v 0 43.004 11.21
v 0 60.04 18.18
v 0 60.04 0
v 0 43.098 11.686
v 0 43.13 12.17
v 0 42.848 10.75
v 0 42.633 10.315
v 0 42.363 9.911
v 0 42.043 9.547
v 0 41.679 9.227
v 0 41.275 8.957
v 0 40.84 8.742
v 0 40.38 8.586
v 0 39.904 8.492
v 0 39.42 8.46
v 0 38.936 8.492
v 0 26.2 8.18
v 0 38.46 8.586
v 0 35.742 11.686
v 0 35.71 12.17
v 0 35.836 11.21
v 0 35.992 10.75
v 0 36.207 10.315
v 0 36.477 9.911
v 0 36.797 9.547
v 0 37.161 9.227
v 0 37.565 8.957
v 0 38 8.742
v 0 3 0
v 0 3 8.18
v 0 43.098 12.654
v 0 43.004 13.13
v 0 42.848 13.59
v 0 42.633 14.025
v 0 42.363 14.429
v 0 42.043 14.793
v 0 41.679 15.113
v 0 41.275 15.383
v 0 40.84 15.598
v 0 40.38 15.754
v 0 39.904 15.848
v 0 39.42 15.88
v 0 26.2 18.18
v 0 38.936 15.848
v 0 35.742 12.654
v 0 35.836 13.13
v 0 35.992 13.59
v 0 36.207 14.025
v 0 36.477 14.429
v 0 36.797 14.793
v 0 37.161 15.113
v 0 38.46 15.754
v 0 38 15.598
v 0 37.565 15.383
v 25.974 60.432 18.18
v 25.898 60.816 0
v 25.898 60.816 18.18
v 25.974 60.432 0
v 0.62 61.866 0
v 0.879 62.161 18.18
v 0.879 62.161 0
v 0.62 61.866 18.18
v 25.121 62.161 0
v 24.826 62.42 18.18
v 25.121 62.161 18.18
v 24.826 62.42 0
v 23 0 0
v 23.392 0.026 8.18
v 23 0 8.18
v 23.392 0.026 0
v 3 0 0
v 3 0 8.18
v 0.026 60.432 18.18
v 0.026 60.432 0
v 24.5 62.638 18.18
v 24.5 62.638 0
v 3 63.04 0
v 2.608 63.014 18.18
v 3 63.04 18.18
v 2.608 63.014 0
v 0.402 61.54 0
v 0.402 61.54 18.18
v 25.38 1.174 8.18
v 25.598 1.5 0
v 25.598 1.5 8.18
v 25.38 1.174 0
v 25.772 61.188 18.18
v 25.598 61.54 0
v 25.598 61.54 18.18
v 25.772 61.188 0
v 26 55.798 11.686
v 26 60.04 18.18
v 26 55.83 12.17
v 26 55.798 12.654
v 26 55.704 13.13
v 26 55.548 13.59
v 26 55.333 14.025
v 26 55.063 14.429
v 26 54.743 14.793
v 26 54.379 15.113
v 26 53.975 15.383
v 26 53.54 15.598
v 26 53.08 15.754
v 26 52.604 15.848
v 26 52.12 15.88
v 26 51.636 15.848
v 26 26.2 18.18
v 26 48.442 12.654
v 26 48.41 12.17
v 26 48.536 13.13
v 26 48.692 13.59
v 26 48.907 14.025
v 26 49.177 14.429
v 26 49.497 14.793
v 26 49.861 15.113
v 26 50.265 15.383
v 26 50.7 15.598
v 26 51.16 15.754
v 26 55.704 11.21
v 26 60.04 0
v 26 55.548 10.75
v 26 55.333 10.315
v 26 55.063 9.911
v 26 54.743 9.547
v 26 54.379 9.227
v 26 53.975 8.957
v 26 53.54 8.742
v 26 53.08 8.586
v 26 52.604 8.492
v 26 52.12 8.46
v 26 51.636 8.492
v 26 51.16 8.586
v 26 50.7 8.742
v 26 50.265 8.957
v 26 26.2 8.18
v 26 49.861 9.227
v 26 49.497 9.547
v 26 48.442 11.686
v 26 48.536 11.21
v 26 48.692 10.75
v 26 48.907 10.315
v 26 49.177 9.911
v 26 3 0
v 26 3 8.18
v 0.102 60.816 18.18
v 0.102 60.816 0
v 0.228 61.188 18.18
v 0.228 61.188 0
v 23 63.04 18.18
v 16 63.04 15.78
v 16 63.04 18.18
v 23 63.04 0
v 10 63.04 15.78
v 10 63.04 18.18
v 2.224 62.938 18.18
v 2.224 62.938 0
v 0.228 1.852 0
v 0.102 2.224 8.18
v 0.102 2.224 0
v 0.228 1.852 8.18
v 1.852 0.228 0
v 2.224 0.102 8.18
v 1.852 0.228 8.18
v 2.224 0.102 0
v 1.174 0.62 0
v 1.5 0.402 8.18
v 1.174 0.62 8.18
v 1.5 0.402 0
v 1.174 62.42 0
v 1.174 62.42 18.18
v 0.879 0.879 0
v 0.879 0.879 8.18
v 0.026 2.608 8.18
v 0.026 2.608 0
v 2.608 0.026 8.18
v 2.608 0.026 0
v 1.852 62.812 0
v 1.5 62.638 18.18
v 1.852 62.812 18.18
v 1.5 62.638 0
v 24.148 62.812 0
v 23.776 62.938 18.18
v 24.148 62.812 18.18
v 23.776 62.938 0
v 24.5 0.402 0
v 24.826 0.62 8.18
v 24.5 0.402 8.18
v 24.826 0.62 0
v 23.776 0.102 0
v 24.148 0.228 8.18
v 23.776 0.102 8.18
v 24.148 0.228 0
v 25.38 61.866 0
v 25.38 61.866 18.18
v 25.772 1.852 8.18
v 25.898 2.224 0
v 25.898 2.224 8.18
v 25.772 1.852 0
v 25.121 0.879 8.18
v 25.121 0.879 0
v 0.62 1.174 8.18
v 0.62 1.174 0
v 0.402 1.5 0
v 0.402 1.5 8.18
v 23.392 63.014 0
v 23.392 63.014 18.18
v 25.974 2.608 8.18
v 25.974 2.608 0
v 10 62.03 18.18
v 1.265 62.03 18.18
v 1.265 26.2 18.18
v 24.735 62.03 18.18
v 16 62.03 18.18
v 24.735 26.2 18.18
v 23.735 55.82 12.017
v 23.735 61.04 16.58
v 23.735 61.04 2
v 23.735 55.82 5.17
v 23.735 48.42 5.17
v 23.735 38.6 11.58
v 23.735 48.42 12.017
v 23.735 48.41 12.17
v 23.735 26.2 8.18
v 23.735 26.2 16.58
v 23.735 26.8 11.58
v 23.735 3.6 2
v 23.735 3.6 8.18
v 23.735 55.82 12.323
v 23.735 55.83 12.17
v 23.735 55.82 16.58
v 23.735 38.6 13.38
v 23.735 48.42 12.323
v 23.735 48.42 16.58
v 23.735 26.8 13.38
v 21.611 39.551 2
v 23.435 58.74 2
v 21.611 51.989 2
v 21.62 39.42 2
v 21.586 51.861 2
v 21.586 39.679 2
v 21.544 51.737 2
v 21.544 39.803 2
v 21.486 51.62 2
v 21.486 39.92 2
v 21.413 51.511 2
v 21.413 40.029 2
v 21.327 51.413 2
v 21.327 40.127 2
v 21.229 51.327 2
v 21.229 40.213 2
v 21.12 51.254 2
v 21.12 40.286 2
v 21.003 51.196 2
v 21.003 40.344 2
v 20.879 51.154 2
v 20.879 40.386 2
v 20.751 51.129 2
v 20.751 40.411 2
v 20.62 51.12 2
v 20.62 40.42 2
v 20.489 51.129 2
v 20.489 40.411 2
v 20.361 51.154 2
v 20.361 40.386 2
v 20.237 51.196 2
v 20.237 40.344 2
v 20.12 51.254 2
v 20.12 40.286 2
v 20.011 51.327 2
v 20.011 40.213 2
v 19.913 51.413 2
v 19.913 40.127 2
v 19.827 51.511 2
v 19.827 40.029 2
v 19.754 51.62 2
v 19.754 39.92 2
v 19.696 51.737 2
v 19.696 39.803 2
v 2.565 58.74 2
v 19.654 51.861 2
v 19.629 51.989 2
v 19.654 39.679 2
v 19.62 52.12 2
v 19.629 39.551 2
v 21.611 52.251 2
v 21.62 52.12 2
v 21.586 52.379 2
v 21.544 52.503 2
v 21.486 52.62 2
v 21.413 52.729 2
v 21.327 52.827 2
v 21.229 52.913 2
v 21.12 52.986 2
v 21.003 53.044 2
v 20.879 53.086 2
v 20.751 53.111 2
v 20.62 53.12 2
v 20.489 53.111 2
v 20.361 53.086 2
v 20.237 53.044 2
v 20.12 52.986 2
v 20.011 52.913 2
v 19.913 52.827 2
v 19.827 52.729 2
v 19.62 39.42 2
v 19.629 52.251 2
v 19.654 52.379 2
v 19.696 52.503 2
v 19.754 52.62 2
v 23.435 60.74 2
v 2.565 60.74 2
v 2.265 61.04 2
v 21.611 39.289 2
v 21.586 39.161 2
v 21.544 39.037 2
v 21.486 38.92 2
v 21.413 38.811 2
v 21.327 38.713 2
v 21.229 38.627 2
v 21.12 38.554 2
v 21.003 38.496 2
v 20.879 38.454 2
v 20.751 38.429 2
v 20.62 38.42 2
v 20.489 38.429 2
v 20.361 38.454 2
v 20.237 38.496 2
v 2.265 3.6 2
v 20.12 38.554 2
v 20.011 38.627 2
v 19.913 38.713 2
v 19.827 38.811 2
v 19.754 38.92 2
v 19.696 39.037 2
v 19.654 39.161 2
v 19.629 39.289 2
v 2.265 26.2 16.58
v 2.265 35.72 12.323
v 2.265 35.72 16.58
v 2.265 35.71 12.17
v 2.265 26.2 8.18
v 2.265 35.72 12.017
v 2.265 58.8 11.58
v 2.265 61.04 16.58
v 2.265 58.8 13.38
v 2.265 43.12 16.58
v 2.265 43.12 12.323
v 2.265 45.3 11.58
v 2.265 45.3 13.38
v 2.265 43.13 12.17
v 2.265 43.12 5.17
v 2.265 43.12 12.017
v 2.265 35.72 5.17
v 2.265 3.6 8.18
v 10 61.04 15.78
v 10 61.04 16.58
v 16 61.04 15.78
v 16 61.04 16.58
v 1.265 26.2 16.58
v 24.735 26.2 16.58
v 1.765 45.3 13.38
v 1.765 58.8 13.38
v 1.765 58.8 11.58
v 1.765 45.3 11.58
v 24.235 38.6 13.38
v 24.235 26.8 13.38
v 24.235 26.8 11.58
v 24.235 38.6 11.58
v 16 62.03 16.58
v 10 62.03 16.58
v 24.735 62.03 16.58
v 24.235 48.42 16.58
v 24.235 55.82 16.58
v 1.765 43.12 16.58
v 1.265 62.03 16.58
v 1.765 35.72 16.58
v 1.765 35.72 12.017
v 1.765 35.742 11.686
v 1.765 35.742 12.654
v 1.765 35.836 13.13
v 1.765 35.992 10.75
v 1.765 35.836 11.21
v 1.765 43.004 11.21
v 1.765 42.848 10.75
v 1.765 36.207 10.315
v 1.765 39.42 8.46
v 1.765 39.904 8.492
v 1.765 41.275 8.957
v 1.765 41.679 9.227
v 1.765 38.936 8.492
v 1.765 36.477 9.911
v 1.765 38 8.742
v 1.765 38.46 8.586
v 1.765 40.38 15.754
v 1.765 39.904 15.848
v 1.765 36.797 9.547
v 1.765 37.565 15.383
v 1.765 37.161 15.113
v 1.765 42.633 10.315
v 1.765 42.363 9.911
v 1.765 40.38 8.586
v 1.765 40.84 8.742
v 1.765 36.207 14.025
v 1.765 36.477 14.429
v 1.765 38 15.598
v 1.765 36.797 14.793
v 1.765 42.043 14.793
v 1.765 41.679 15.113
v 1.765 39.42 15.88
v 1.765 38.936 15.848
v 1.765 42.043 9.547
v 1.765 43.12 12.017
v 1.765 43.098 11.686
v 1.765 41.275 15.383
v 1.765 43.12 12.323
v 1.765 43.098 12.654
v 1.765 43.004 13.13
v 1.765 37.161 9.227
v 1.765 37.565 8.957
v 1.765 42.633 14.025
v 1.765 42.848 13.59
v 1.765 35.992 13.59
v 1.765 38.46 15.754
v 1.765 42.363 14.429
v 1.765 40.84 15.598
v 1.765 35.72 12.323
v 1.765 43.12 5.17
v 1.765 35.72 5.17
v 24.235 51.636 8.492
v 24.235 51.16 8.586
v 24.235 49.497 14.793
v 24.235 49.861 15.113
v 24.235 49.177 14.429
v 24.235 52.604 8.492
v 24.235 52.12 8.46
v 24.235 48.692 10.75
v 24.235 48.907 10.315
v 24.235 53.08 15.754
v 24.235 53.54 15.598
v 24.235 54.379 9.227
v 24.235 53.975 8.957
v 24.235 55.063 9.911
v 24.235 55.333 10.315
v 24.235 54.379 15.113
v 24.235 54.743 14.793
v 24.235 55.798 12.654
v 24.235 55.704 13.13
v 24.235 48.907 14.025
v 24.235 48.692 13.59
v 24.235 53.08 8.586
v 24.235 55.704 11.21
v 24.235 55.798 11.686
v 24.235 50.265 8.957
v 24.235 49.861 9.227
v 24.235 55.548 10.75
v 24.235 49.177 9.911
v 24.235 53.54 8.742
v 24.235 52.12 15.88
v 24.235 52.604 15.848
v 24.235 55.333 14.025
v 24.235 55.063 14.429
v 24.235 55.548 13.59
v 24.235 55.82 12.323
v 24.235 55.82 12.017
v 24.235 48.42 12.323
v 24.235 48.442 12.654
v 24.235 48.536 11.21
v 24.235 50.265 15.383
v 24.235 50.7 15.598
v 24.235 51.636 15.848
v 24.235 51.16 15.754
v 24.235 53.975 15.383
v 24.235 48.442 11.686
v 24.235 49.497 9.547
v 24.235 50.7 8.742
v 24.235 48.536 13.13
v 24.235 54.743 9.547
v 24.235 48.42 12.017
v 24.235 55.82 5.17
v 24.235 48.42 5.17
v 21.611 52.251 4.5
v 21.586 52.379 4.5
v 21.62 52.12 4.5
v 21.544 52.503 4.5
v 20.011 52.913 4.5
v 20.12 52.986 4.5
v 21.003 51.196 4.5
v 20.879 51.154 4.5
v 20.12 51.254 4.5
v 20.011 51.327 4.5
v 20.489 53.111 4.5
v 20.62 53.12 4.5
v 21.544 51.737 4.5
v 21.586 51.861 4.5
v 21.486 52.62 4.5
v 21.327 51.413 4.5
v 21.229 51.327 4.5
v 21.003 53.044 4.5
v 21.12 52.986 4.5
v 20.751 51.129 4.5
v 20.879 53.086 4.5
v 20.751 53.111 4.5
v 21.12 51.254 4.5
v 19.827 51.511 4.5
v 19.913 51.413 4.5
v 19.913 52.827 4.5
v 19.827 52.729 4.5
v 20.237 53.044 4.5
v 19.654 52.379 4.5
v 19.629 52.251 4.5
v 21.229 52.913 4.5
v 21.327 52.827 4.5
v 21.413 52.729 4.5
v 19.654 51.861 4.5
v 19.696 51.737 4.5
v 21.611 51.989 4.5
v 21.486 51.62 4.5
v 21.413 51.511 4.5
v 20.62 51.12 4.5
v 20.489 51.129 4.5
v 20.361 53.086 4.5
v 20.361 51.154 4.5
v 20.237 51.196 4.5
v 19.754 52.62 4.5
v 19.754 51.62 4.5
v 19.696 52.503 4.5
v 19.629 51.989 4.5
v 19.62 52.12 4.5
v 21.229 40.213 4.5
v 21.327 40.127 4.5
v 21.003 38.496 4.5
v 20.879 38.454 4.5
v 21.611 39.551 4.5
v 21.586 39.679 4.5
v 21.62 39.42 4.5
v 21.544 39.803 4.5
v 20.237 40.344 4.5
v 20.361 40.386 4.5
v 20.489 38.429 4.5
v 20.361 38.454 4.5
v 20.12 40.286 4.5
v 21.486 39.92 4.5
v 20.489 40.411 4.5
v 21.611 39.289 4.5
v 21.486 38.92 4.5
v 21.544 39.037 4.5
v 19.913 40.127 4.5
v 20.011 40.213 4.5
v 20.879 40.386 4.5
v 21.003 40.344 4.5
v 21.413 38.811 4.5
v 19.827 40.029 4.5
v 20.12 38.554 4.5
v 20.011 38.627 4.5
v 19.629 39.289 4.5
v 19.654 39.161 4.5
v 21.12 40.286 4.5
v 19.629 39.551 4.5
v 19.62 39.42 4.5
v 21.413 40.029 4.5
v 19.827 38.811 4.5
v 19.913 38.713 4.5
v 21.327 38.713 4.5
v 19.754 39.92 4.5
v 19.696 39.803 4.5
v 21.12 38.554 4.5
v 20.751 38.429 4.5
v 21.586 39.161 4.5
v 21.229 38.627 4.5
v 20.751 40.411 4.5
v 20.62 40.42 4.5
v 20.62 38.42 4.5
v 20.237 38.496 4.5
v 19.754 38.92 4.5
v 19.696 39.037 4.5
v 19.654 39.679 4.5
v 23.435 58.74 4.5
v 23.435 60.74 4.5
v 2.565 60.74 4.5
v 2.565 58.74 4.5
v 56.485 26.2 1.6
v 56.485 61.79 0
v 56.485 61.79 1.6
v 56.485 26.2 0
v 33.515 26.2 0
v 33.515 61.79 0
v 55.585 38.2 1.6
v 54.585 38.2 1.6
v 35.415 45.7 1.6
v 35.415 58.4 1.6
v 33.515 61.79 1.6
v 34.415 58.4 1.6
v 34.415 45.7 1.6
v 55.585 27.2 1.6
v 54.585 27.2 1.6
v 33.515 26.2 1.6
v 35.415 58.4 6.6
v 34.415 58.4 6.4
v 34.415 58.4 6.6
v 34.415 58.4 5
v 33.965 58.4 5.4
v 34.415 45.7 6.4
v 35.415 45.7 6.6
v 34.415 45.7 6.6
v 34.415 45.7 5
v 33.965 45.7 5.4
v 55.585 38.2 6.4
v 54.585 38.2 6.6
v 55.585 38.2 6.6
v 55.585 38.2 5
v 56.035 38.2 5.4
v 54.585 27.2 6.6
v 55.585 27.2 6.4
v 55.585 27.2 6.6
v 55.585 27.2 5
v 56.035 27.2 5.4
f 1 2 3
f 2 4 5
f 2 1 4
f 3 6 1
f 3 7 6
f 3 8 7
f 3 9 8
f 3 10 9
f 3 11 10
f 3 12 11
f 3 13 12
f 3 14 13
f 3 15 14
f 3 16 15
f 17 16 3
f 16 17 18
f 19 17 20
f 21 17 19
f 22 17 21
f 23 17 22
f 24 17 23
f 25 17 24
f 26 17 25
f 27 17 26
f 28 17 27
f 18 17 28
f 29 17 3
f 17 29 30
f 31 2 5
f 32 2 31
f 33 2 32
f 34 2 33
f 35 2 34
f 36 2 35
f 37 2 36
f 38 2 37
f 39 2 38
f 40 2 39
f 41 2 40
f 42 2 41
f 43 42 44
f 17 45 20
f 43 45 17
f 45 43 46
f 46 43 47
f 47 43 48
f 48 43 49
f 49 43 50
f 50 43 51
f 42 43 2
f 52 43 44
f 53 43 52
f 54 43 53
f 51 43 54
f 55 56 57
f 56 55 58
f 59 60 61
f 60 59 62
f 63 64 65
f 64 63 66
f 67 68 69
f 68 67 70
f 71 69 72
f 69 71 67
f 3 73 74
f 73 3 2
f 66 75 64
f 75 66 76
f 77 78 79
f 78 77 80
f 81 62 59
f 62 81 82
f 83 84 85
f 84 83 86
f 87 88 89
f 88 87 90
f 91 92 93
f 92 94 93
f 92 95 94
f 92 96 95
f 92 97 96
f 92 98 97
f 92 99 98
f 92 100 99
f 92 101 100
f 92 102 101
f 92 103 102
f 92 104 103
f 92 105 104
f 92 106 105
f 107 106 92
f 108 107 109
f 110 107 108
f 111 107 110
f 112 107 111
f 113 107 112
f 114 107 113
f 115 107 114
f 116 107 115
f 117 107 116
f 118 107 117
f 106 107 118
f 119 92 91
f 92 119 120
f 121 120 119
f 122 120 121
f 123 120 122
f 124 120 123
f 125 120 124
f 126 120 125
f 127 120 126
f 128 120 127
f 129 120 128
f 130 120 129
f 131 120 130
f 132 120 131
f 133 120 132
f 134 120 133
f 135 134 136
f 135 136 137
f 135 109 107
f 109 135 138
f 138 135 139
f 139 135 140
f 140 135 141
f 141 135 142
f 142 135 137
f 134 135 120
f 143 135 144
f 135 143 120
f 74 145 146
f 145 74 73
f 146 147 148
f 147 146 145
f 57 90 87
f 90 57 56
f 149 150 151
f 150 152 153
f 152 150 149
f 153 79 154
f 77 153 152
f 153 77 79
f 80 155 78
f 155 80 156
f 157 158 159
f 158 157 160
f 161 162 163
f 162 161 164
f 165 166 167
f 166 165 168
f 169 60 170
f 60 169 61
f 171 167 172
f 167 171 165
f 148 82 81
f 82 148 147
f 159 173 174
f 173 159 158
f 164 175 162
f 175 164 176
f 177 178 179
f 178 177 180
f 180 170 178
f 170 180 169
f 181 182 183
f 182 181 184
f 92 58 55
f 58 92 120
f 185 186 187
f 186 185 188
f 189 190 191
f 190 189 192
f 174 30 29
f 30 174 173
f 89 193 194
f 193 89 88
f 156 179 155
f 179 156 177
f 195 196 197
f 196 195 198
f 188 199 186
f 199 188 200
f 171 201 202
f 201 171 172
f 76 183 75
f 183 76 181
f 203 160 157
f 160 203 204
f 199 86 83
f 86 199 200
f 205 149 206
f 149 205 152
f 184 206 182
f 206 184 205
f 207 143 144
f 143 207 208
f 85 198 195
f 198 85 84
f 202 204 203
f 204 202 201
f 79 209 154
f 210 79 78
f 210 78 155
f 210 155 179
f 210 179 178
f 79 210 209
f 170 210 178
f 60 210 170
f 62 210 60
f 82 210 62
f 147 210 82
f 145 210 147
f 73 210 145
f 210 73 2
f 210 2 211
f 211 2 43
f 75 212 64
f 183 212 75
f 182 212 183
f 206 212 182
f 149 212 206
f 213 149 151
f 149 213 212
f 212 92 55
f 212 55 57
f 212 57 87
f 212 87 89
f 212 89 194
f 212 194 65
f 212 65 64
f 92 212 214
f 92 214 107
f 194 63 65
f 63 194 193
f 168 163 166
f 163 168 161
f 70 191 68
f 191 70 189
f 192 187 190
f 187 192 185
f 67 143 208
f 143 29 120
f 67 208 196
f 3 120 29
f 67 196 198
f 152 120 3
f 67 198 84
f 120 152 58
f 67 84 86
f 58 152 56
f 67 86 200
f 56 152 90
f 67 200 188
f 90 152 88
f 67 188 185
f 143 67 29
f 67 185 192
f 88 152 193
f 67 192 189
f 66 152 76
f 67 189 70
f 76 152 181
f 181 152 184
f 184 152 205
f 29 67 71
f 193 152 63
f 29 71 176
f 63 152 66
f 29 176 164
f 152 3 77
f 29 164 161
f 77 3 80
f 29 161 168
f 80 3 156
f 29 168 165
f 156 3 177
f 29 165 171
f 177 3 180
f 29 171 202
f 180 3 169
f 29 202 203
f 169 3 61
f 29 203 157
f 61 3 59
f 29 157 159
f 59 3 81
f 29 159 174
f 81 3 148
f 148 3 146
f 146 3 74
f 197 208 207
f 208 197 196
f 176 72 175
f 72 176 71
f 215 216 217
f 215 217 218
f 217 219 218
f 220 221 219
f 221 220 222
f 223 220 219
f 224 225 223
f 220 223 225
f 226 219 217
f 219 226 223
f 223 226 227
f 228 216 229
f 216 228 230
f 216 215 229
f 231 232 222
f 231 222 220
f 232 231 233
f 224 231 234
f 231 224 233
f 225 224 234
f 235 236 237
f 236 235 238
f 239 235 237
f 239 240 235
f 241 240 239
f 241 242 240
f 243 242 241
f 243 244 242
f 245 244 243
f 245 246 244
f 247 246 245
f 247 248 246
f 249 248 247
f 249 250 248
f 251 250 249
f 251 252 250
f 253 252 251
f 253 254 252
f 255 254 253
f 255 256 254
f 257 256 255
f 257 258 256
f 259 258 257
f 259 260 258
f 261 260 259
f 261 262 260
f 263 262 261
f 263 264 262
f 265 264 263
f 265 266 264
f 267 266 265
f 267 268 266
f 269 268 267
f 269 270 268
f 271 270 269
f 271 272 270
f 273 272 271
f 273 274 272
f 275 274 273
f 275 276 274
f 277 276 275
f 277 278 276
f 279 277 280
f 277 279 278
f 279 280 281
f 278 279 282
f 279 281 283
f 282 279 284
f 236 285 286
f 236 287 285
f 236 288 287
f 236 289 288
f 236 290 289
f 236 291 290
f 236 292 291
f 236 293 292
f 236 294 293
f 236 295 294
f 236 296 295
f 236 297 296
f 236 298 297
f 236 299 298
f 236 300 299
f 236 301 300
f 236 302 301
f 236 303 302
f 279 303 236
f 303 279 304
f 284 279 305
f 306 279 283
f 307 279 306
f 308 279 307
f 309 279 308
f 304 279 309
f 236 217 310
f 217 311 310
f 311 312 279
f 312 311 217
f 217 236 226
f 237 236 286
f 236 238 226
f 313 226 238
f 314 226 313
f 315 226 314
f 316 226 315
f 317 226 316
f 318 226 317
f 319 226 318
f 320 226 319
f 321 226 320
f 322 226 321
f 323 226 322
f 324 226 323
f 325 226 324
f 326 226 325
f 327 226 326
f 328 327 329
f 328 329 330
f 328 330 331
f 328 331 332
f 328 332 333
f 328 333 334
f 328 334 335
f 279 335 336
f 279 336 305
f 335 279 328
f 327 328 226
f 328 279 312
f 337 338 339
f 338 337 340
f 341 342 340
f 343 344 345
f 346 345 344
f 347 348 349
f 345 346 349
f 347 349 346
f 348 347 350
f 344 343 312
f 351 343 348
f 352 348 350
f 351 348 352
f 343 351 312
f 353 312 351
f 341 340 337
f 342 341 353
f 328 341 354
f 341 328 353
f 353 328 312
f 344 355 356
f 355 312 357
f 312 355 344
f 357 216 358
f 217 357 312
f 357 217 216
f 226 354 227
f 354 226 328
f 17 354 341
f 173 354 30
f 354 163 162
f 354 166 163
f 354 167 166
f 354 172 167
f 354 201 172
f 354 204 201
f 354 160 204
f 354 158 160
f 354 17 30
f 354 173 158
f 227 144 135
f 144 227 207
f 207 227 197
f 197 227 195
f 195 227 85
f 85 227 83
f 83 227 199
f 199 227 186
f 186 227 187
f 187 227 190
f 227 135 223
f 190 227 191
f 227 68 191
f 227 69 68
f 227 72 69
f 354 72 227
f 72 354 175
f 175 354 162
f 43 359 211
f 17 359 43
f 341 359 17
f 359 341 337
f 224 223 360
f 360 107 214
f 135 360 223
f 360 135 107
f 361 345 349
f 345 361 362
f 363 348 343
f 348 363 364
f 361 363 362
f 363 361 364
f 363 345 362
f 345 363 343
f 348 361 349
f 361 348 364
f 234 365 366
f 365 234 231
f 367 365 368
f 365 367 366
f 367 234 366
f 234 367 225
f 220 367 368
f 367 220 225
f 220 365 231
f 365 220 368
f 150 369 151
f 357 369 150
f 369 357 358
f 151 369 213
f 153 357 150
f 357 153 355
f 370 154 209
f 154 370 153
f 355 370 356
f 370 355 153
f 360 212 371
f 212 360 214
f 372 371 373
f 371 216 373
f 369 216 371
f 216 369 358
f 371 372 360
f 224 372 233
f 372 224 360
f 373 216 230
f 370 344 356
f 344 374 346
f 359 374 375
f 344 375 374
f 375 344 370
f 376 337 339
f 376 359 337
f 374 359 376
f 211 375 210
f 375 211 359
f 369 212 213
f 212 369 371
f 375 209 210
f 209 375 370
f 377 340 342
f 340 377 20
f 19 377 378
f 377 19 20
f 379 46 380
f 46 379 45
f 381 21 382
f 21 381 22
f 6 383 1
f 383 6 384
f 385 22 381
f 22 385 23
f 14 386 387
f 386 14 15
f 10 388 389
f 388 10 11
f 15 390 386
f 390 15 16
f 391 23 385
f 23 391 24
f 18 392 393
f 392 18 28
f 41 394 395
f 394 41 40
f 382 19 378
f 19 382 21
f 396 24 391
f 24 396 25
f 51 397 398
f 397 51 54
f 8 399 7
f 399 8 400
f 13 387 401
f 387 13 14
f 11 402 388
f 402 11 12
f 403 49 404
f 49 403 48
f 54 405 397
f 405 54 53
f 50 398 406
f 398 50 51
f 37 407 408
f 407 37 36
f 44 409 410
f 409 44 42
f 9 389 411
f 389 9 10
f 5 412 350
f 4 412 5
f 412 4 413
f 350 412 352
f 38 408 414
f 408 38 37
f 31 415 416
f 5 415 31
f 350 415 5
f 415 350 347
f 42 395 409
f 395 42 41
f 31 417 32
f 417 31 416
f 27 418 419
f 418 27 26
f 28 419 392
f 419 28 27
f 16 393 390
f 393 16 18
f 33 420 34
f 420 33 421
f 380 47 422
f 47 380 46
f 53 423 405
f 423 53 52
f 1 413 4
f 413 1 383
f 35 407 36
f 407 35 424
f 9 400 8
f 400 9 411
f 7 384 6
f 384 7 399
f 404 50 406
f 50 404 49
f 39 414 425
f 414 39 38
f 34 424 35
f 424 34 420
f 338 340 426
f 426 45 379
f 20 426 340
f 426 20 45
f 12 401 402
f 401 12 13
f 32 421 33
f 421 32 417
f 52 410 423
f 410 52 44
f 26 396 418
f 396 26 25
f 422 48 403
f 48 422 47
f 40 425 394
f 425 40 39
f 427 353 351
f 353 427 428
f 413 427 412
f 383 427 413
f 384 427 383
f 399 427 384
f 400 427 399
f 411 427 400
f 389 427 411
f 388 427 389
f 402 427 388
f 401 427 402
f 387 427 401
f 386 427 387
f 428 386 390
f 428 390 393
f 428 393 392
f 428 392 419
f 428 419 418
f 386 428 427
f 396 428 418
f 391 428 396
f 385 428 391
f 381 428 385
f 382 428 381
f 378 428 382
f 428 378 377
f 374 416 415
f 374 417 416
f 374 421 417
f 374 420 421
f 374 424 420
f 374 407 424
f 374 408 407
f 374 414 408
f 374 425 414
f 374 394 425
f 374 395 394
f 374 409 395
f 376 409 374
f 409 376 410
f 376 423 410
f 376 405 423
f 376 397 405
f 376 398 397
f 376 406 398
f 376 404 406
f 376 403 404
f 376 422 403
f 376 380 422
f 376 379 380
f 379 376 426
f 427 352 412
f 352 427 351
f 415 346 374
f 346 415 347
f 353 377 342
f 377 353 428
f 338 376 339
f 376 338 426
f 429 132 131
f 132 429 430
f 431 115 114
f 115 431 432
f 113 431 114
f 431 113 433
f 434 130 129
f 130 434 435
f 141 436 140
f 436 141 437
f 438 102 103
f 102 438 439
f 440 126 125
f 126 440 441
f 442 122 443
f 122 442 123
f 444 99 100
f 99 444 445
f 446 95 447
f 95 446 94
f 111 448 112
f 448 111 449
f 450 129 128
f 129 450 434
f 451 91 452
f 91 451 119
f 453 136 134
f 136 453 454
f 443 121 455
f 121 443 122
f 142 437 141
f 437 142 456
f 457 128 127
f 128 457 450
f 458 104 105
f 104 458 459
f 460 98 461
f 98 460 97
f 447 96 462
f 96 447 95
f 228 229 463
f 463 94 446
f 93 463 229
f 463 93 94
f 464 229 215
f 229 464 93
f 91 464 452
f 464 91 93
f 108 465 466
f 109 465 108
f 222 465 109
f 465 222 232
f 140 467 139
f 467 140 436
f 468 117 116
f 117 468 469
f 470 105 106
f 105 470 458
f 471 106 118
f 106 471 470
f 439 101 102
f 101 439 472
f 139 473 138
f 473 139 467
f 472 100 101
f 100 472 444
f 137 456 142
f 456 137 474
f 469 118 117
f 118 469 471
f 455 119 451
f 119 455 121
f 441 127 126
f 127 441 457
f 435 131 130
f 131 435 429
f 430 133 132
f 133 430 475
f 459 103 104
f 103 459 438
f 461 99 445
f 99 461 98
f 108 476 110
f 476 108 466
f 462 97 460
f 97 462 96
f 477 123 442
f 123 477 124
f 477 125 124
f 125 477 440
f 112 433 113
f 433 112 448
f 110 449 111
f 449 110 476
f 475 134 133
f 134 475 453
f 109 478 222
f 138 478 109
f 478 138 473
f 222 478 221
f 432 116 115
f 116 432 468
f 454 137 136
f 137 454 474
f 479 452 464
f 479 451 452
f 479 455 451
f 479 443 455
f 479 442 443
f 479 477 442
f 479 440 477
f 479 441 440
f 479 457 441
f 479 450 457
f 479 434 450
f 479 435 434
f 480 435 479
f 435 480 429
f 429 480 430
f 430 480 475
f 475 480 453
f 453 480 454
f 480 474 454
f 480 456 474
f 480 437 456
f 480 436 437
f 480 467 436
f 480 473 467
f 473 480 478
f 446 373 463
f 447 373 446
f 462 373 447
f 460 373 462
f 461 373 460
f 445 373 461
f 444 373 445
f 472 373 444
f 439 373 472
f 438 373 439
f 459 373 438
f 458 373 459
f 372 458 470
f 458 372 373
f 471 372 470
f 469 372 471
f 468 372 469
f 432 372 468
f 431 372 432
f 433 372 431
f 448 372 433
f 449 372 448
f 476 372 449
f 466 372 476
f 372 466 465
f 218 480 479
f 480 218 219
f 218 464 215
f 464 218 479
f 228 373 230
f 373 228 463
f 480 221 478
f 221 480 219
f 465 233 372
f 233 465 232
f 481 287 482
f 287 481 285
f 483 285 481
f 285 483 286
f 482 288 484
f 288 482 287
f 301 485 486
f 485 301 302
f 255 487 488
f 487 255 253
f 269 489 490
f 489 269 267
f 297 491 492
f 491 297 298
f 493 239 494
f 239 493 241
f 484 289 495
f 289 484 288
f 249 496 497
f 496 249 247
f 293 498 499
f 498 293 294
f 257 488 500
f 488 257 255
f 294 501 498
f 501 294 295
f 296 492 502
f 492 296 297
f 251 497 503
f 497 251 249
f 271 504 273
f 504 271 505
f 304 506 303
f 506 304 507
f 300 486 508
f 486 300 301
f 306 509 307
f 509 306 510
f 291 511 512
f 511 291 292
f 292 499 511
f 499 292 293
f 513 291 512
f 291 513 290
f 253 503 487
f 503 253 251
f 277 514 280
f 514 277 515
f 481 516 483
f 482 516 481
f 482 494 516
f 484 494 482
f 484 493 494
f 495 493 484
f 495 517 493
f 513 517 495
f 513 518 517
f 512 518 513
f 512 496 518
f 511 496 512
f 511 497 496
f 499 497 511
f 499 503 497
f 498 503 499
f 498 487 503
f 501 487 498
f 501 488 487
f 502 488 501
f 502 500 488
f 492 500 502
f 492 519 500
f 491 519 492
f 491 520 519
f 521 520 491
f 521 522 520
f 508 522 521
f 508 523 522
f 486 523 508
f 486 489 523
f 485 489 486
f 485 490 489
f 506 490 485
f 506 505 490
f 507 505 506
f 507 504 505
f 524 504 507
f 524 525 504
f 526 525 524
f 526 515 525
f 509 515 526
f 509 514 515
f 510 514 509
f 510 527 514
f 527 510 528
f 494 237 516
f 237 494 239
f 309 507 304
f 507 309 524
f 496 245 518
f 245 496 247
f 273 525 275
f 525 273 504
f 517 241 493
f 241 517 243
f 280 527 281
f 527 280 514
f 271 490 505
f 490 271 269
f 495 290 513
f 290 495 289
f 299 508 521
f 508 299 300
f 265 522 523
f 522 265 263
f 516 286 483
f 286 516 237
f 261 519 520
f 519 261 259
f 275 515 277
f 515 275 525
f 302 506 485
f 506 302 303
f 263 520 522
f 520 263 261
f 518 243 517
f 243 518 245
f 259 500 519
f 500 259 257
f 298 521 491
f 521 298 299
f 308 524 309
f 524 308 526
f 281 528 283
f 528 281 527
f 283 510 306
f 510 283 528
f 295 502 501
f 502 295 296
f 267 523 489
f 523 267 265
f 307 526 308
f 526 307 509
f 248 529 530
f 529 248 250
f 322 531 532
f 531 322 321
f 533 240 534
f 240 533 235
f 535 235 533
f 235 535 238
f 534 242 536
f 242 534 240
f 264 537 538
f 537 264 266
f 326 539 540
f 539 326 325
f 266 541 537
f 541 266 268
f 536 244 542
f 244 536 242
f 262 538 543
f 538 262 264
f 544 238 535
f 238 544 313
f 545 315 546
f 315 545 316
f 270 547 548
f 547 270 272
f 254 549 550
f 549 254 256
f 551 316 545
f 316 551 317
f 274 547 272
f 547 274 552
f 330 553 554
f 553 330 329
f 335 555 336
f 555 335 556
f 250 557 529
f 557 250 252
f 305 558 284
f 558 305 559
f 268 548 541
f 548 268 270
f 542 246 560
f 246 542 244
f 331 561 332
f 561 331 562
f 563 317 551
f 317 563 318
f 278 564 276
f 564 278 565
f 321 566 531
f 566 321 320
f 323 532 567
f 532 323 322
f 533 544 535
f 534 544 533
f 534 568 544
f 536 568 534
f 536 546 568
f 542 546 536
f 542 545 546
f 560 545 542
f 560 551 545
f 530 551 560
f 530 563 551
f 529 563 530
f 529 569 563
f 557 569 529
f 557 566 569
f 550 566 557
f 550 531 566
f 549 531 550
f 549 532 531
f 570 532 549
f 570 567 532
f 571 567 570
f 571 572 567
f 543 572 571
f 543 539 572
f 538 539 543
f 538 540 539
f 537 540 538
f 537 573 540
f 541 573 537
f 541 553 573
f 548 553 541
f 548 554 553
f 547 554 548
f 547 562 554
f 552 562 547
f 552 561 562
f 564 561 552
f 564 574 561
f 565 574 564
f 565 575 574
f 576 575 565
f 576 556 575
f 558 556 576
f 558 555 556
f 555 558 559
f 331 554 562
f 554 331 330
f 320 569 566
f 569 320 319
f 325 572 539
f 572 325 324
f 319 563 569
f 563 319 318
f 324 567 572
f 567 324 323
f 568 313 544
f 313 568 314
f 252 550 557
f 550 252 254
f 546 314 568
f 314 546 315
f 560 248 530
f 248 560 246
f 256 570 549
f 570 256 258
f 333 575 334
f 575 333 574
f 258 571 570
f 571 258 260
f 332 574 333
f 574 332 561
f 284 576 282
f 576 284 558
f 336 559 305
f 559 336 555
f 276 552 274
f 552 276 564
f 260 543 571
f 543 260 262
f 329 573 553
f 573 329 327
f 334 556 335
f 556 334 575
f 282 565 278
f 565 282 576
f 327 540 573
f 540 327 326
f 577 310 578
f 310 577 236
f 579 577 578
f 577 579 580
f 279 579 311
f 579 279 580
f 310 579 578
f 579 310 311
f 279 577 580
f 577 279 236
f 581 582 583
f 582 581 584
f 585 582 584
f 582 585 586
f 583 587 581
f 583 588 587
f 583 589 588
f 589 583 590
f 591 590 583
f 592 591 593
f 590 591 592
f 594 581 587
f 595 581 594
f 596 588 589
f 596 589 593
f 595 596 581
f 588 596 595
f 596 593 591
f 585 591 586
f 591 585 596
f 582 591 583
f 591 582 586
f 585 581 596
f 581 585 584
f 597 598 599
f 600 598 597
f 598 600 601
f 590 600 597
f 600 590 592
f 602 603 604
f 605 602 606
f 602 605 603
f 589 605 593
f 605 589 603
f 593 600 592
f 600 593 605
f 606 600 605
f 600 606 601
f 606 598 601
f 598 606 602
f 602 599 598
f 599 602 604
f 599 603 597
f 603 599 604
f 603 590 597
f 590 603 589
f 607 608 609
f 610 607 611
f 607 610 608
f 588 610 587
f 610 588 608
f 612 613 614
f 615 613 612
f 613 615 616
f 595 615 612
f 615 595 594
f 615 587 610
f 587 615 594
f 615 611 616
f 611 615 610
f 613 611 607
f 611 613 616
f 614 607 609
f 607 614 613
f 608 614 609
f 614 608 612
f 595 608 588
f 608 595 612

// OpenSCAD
// Keyer case in the form of an M5 Atomic base (cf. ATOM PWM base, docs/reference/M5_Atom_PWM_base_drawing.pdf:
// 24 wide, R3 corners, the Atom sits on a low step at one end and its top is flush with the tall end,
// no mounting hole: it sits on the desk). Ours is longer (about 63 mm) because the carrier board is 22 rows.
//
// Orientation: USB-C to the RIGHT, viewed from above. KEY jack (to the radio) out the top/far wall,
// PADDLE jack out the bottom/near wall, toward you.
//
// Coordinates (seen from above, z up): y = 0 at the USB-C end, z = 0 at the bottom.
// x = 0 is the PADDLE (column 1) wall, x = outer_w the KEY (column 7) wall. Check: with y = 0 at the bottom of
// the screen the key wall is on the right; turn 90° counterclockwise so USB points right and the key wall is on top.
// Two parts: the tray (print open side up) and the lid over the jack end (print top face down, snap skirts up).
// The lid snaps in with two tabs; lift it at the notch in the far end.
// The carrier hangs from the Atom's headers and rests on a ledge under row V plus two posts.
//
// FIRST PRINT IS A TEST FIT. Check the values marked MEASURE against the built board.

part = "both";          // "tray", "lid", "both" or "assembled" (check only)

// ---- Board (MEASURE) ----
pitch        = 2.54;
board_w      = 20.87;         // measured 2026-11-21 (wider than 7 columns; margin assumed equal both sides)
board_l      = 56.84;         // measured
board_t      = 1.17;          // measured
col_margin   = (board_w - 7 * pitch) / 2;                // long edge to the edge of column 1's pitch cell (assumed equal;
                                                         // headers are in cols 1 and 7, centred on the Atom)
board_gap    = 2.5;           // under-board clearance; solder sticks out 1.5-2 mm (measured)

// ---- Atom (MEASURE atom_standoff) ----
atom_w       = 24;
atom_l       = 24;
atom_h       = 10;
atom_standoff = 3.68 - 1.17;  // measured: board bottom to Atom bottom 3.68, minus the board
atom_overhang = 2;            // measured: the Atom sticks 2 mm past the board's USB-end edge
atom_pin1_y  = 4.5;           // measured: Atom USB-end face to the centre of its first header pin (row A)

// ---- Case ----
outer_w      = 26;            // 24 like the Atom leaves 1.27 mm walls around the 20.87 mm board; 26 gives 2 mm
corner_r     = 3;             // R3 like the M5 bases
floor_t      = 2;
end_wall     = 1.6;           // wall under the Atom at the USB end
clr          = 0.3;           // board clearance all round
far_wall     = 2;

// ---- Jacks (Kycon STX-3120: hole centre 6.5 mm above the board (measured)) ----
jack_proud   = 0.5;           // measured: the jack front sticks 0.5 mm past the board's long edge
plug_d       = 6.75;          // measured: plug body diameter
jack_hole_d  = max(plug_d, 6.82) + 0.6;  // straight through the wall: the plug body reaches the jack front and seats fully
jack_body_w  = 7.4;           // relief in the inner wall for the jack body (6.82 measured)
jack_z_above_board = 6.5;     // measured 2026-11-21 directly (matches the datasheet)
paddle_row   = 11 + 2;        // N: paddle jack (rows L-P, middle), opens on the x = 0 wall (bottom, toward you)
key_row      = 16 + 2;        // S: key jack (rows Q-U, far end), opens on the x = outer_w wall (top, USB right)

// ---- Lid ----
lid_t        = 1.6;
lid_clr      = 0.25;
// Snap tabs: a flexible skirt hangs from each long edge of the lid; a ridge on it clicks into a groove in the wall.
// Placed diagonally, clear of the jacks: paddle wall at rows Q-U, key wall at rows J-M.
snap_h       = 5;             // skirt height below the lid (long enough to flex without cracking PETG)
snap_t       = 1.0;           // skirt thickness
snap_gap     = 0.15;          // skirt to wall
snap_bump    = 0.45;          // ridge height: 0.3 mm interference while pushing in
snap_groove  = 0.5;           // groove depth in the wall

// ---- Derived ----
atom_y0      = end_wall + clr;                      // Atom's USB-end face
board_y0     = atom_y0 + atom_overhang;
board_x0     = (outer_w - board_w) / 2;
board_bot_z  = floor_t + board_gap;
board_top_z  = board_bot_z + board_t;
atom_bot_z   = board_top_z + atom_standoff;
outer_h      = atom_bot_z + atom_h;                 // flush with the Atom top
outer_l      = board_y0 + board_l + clr + far_wall;
inner_w      = board_w + 2 * clr;
pocket_end_y = atom_y0 + atom_l + 0.3;              // walls step down until here
lid_z        = outer_h - lid_t;                     // underside of the lid
snap_zb      = lid_z - snap_h + 1.2;                // ridge peak height
snap_paddle  = [pocket_end_y + 19.5, pocket_end_y + 32.2];   // y range, paddle (x = 0) wall
snap_key     = [pocket_end_y + 1, pocket_end_y + 12];        // y range, key (x = outer_w) wall
jack_z       = board_top_z + jack_z_above_board;
wall_t       = board_x0 - clr;
function row_y(r) = atom_y0 + atom_pin1_y + r * pitch;   // rows located from the Atom's first header pin
function col_x(c) = board_x0 + col_margin + pitch / 2 + (c - 1) * pitch;   // col 1 nearest x = 0, col 7 nearest x = outer_w

$fn = 48;

module rounded_box(w, l, h, r) {
    hull() for (x = [r, w - r], y = [r, l - r]) translate([x, y, 0]) cylinder(r = r, h = h);
}

module tray() {
    difference() {
        rounded_box(outer_w, outer_l, outer_h, corner_r);
        // cavity
        translate([board_x0 - clr, board_y0 - clr, floor_t])
            cube([inner_w, board_l + 2 * clr, outer_h]);
        // Atom step: full width from the USB end, down to the Atom's underside
        translate([-1, -1, atom_bot_z]) cube([outer_w + 2, pocket_end_y + 1, outer_h]);
        // snap grooves (the key side is mirrored)
        snap_groove_cut(snap_paddle);
        translate([outer_w, 0, 0]) mirror([1, 0, 0]) snap_groove_cut(snap_key);
        // pry notch in the far wall to lift the lid
        translate([outer_w / 2 - 3, outer_l - far_wall - 0.5, lid_z - 0.8]) cube([6, far_wall + 1, lid_t + 1]);
        // lid rebate over the jack end
        translate([board_x0 - clr - 1, pocket_end_y - 0.01, outer_h - lid_t])
            cube([inner_w + 2, outer_l - far_wall + 1 - pocket_end_y, lid_t + 1]);
        // PADDLE jack: x = 0 wall, row N. Plug hole straight through, plus a slot for the jack body (0.5 mm past the board edge)
        // running up to the top, so the board lowers straight in with the jacks sliding down the slots.
        translate([-1, row_y(paddle_row), jack_z]) rotate([0, 90, 0]) cylinder(d = jack_hole_d, h = wall_t + 2);
        translate([board_x0 - jack_proud - 0.3, row_y(paddle_row) - jack_body_w / 2, board_top_z - 0.5])
            cube([jack_proud + 0.5, jack_body_w, outer_h]);   // slot to the top: the board drops straight in
        // KEY jack: x = outer_w wall, row S
        translate([outer_w - wall_t - 1, row_y(key_row), jack_z]) rotate([0, 90, 0]) cylinder(d = jack_hole_d, h = wall_t + 2);
        translate([board_x0 + board_w - 0.2, row_y(key_row) - jack_body_w / 2, board_top_z - 0.5])
            cube([jack_proud + 0.5, jack_body_w, outer_h]);   // slot to the top: the board drops straight in
    }
    // ledge under row V (no joints there) at the far end
    translate([board_x0, row_y(21) - 1, floor_t]) cube([board_w, 2, board_gap]);
    // posts under the jacks at column 7 (N7, S7 have no joints; key pin 1 is at S6)
    for (r = [key_row, paddle_row])
        translate([col_x(7), row_y(r), floor_t]) cylinder(d = 2, h = board_gap);
}

// Skirt profile in the x-z plane for the x = 0 wall: the ridge points toward the wall.
// Long slope underneath (lead-in as the lid goes down), steeper on top (holds).
module snap_skirt(yr) {
    x0 = wall_t + snap_gap;
    translate([0, yr[1], 0]) rotate([90, 0, 0]) linear_extrude(height = yr[1] - yr[0])
        polygon([[x0, lid_z + 0.01], [x0, snap_zb + 0.4], [x0 - snap_bump, snap_zb], [x0, snap_zb - 1.0],
                 [x0, lid_z - snap_h], [x0 + snap_t, lid_z - snap_h], [x0 + snap_t, lid_z + 0.01]]);
}
module snap_groove_cut(yr) {
    translate([wall_t - snap_groove, yr[0] - 0.4, snap_zb - 1.2]) cube([snap_groove + 0.01, yr[1] - yr[0] + 0.8, 1.8]);
}

// The lid in its installed position (tray coordinates).
module lid_installed() {
    translate([wall_t - 1 + lid_clr, pocket_end_y, lid_z])
        cube([inner_w + 2 - 2 * lid_clr, outer_l - far_wall + 1 - pocket_end_y - lid_clr, lid_t]);
    snap_skirt(snap_paddle);
    translate([outer_w, 0, 0]) mirror([1, 0, 0]) snap_skirt(snap_key);
}

// For printing: flipped, top face on the bed, skirts pointing up.
module lid() {
    translate([0, 0, outer_h]) mirror([0, 0, 1]) lid_installed();
}

if (part == "tray" || part == "both") tray();
if (part == "lid"  || part == "both") translate([outer_w + 6, 0, 0]) lid();
if (part == "assembled") { tray(); color("orange") lid_installed(); }

echo(str("Wall at the jacks ", wall_t, " mm; Outside ", outer_w, " x ", outer_l, " x ", outer_h, " mm; step (Atom underside) at z = ", atom_bot_z,
         "; jack centres at z = ", jack_z, "; plug hole top at z = ", jack_z + jack_hole_d / 2, " (lid rebate at ", outer_h - lid_t, ")"));
